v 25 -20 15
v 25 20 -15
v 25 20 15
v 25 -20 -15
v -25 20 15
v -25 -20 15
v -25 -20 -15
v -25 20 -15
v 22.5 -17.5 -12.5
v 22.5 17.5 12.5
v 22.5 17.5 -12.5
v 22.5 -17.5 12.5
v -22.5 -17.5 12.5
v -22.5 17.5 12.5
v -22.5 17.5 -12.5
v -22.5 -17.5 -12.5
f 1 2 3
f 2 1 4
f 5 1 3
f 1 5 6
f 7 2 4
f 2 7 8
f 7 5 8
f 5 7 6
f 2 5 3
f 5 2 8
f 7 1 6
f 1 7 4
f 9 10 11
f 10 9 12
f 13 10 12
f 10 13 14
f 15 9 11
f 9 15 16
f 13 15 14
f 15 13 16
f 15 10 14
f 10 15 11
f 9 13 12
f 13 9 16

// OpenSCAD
// Fully sealed enclosure: one outer shell around one enclosed void.
outer_x = 50;
outer_y = 40;
outer_z = 30;
wall = 2.5;

module enclosure() {
    difference() {
        cube([outer_x, outer_y, outer_z], center = true);
        cube([outer_x - 2 * wall, outer_y - 2 * wall, outer_z - 2 * wall], center = true);
    }
}

enclosure();
